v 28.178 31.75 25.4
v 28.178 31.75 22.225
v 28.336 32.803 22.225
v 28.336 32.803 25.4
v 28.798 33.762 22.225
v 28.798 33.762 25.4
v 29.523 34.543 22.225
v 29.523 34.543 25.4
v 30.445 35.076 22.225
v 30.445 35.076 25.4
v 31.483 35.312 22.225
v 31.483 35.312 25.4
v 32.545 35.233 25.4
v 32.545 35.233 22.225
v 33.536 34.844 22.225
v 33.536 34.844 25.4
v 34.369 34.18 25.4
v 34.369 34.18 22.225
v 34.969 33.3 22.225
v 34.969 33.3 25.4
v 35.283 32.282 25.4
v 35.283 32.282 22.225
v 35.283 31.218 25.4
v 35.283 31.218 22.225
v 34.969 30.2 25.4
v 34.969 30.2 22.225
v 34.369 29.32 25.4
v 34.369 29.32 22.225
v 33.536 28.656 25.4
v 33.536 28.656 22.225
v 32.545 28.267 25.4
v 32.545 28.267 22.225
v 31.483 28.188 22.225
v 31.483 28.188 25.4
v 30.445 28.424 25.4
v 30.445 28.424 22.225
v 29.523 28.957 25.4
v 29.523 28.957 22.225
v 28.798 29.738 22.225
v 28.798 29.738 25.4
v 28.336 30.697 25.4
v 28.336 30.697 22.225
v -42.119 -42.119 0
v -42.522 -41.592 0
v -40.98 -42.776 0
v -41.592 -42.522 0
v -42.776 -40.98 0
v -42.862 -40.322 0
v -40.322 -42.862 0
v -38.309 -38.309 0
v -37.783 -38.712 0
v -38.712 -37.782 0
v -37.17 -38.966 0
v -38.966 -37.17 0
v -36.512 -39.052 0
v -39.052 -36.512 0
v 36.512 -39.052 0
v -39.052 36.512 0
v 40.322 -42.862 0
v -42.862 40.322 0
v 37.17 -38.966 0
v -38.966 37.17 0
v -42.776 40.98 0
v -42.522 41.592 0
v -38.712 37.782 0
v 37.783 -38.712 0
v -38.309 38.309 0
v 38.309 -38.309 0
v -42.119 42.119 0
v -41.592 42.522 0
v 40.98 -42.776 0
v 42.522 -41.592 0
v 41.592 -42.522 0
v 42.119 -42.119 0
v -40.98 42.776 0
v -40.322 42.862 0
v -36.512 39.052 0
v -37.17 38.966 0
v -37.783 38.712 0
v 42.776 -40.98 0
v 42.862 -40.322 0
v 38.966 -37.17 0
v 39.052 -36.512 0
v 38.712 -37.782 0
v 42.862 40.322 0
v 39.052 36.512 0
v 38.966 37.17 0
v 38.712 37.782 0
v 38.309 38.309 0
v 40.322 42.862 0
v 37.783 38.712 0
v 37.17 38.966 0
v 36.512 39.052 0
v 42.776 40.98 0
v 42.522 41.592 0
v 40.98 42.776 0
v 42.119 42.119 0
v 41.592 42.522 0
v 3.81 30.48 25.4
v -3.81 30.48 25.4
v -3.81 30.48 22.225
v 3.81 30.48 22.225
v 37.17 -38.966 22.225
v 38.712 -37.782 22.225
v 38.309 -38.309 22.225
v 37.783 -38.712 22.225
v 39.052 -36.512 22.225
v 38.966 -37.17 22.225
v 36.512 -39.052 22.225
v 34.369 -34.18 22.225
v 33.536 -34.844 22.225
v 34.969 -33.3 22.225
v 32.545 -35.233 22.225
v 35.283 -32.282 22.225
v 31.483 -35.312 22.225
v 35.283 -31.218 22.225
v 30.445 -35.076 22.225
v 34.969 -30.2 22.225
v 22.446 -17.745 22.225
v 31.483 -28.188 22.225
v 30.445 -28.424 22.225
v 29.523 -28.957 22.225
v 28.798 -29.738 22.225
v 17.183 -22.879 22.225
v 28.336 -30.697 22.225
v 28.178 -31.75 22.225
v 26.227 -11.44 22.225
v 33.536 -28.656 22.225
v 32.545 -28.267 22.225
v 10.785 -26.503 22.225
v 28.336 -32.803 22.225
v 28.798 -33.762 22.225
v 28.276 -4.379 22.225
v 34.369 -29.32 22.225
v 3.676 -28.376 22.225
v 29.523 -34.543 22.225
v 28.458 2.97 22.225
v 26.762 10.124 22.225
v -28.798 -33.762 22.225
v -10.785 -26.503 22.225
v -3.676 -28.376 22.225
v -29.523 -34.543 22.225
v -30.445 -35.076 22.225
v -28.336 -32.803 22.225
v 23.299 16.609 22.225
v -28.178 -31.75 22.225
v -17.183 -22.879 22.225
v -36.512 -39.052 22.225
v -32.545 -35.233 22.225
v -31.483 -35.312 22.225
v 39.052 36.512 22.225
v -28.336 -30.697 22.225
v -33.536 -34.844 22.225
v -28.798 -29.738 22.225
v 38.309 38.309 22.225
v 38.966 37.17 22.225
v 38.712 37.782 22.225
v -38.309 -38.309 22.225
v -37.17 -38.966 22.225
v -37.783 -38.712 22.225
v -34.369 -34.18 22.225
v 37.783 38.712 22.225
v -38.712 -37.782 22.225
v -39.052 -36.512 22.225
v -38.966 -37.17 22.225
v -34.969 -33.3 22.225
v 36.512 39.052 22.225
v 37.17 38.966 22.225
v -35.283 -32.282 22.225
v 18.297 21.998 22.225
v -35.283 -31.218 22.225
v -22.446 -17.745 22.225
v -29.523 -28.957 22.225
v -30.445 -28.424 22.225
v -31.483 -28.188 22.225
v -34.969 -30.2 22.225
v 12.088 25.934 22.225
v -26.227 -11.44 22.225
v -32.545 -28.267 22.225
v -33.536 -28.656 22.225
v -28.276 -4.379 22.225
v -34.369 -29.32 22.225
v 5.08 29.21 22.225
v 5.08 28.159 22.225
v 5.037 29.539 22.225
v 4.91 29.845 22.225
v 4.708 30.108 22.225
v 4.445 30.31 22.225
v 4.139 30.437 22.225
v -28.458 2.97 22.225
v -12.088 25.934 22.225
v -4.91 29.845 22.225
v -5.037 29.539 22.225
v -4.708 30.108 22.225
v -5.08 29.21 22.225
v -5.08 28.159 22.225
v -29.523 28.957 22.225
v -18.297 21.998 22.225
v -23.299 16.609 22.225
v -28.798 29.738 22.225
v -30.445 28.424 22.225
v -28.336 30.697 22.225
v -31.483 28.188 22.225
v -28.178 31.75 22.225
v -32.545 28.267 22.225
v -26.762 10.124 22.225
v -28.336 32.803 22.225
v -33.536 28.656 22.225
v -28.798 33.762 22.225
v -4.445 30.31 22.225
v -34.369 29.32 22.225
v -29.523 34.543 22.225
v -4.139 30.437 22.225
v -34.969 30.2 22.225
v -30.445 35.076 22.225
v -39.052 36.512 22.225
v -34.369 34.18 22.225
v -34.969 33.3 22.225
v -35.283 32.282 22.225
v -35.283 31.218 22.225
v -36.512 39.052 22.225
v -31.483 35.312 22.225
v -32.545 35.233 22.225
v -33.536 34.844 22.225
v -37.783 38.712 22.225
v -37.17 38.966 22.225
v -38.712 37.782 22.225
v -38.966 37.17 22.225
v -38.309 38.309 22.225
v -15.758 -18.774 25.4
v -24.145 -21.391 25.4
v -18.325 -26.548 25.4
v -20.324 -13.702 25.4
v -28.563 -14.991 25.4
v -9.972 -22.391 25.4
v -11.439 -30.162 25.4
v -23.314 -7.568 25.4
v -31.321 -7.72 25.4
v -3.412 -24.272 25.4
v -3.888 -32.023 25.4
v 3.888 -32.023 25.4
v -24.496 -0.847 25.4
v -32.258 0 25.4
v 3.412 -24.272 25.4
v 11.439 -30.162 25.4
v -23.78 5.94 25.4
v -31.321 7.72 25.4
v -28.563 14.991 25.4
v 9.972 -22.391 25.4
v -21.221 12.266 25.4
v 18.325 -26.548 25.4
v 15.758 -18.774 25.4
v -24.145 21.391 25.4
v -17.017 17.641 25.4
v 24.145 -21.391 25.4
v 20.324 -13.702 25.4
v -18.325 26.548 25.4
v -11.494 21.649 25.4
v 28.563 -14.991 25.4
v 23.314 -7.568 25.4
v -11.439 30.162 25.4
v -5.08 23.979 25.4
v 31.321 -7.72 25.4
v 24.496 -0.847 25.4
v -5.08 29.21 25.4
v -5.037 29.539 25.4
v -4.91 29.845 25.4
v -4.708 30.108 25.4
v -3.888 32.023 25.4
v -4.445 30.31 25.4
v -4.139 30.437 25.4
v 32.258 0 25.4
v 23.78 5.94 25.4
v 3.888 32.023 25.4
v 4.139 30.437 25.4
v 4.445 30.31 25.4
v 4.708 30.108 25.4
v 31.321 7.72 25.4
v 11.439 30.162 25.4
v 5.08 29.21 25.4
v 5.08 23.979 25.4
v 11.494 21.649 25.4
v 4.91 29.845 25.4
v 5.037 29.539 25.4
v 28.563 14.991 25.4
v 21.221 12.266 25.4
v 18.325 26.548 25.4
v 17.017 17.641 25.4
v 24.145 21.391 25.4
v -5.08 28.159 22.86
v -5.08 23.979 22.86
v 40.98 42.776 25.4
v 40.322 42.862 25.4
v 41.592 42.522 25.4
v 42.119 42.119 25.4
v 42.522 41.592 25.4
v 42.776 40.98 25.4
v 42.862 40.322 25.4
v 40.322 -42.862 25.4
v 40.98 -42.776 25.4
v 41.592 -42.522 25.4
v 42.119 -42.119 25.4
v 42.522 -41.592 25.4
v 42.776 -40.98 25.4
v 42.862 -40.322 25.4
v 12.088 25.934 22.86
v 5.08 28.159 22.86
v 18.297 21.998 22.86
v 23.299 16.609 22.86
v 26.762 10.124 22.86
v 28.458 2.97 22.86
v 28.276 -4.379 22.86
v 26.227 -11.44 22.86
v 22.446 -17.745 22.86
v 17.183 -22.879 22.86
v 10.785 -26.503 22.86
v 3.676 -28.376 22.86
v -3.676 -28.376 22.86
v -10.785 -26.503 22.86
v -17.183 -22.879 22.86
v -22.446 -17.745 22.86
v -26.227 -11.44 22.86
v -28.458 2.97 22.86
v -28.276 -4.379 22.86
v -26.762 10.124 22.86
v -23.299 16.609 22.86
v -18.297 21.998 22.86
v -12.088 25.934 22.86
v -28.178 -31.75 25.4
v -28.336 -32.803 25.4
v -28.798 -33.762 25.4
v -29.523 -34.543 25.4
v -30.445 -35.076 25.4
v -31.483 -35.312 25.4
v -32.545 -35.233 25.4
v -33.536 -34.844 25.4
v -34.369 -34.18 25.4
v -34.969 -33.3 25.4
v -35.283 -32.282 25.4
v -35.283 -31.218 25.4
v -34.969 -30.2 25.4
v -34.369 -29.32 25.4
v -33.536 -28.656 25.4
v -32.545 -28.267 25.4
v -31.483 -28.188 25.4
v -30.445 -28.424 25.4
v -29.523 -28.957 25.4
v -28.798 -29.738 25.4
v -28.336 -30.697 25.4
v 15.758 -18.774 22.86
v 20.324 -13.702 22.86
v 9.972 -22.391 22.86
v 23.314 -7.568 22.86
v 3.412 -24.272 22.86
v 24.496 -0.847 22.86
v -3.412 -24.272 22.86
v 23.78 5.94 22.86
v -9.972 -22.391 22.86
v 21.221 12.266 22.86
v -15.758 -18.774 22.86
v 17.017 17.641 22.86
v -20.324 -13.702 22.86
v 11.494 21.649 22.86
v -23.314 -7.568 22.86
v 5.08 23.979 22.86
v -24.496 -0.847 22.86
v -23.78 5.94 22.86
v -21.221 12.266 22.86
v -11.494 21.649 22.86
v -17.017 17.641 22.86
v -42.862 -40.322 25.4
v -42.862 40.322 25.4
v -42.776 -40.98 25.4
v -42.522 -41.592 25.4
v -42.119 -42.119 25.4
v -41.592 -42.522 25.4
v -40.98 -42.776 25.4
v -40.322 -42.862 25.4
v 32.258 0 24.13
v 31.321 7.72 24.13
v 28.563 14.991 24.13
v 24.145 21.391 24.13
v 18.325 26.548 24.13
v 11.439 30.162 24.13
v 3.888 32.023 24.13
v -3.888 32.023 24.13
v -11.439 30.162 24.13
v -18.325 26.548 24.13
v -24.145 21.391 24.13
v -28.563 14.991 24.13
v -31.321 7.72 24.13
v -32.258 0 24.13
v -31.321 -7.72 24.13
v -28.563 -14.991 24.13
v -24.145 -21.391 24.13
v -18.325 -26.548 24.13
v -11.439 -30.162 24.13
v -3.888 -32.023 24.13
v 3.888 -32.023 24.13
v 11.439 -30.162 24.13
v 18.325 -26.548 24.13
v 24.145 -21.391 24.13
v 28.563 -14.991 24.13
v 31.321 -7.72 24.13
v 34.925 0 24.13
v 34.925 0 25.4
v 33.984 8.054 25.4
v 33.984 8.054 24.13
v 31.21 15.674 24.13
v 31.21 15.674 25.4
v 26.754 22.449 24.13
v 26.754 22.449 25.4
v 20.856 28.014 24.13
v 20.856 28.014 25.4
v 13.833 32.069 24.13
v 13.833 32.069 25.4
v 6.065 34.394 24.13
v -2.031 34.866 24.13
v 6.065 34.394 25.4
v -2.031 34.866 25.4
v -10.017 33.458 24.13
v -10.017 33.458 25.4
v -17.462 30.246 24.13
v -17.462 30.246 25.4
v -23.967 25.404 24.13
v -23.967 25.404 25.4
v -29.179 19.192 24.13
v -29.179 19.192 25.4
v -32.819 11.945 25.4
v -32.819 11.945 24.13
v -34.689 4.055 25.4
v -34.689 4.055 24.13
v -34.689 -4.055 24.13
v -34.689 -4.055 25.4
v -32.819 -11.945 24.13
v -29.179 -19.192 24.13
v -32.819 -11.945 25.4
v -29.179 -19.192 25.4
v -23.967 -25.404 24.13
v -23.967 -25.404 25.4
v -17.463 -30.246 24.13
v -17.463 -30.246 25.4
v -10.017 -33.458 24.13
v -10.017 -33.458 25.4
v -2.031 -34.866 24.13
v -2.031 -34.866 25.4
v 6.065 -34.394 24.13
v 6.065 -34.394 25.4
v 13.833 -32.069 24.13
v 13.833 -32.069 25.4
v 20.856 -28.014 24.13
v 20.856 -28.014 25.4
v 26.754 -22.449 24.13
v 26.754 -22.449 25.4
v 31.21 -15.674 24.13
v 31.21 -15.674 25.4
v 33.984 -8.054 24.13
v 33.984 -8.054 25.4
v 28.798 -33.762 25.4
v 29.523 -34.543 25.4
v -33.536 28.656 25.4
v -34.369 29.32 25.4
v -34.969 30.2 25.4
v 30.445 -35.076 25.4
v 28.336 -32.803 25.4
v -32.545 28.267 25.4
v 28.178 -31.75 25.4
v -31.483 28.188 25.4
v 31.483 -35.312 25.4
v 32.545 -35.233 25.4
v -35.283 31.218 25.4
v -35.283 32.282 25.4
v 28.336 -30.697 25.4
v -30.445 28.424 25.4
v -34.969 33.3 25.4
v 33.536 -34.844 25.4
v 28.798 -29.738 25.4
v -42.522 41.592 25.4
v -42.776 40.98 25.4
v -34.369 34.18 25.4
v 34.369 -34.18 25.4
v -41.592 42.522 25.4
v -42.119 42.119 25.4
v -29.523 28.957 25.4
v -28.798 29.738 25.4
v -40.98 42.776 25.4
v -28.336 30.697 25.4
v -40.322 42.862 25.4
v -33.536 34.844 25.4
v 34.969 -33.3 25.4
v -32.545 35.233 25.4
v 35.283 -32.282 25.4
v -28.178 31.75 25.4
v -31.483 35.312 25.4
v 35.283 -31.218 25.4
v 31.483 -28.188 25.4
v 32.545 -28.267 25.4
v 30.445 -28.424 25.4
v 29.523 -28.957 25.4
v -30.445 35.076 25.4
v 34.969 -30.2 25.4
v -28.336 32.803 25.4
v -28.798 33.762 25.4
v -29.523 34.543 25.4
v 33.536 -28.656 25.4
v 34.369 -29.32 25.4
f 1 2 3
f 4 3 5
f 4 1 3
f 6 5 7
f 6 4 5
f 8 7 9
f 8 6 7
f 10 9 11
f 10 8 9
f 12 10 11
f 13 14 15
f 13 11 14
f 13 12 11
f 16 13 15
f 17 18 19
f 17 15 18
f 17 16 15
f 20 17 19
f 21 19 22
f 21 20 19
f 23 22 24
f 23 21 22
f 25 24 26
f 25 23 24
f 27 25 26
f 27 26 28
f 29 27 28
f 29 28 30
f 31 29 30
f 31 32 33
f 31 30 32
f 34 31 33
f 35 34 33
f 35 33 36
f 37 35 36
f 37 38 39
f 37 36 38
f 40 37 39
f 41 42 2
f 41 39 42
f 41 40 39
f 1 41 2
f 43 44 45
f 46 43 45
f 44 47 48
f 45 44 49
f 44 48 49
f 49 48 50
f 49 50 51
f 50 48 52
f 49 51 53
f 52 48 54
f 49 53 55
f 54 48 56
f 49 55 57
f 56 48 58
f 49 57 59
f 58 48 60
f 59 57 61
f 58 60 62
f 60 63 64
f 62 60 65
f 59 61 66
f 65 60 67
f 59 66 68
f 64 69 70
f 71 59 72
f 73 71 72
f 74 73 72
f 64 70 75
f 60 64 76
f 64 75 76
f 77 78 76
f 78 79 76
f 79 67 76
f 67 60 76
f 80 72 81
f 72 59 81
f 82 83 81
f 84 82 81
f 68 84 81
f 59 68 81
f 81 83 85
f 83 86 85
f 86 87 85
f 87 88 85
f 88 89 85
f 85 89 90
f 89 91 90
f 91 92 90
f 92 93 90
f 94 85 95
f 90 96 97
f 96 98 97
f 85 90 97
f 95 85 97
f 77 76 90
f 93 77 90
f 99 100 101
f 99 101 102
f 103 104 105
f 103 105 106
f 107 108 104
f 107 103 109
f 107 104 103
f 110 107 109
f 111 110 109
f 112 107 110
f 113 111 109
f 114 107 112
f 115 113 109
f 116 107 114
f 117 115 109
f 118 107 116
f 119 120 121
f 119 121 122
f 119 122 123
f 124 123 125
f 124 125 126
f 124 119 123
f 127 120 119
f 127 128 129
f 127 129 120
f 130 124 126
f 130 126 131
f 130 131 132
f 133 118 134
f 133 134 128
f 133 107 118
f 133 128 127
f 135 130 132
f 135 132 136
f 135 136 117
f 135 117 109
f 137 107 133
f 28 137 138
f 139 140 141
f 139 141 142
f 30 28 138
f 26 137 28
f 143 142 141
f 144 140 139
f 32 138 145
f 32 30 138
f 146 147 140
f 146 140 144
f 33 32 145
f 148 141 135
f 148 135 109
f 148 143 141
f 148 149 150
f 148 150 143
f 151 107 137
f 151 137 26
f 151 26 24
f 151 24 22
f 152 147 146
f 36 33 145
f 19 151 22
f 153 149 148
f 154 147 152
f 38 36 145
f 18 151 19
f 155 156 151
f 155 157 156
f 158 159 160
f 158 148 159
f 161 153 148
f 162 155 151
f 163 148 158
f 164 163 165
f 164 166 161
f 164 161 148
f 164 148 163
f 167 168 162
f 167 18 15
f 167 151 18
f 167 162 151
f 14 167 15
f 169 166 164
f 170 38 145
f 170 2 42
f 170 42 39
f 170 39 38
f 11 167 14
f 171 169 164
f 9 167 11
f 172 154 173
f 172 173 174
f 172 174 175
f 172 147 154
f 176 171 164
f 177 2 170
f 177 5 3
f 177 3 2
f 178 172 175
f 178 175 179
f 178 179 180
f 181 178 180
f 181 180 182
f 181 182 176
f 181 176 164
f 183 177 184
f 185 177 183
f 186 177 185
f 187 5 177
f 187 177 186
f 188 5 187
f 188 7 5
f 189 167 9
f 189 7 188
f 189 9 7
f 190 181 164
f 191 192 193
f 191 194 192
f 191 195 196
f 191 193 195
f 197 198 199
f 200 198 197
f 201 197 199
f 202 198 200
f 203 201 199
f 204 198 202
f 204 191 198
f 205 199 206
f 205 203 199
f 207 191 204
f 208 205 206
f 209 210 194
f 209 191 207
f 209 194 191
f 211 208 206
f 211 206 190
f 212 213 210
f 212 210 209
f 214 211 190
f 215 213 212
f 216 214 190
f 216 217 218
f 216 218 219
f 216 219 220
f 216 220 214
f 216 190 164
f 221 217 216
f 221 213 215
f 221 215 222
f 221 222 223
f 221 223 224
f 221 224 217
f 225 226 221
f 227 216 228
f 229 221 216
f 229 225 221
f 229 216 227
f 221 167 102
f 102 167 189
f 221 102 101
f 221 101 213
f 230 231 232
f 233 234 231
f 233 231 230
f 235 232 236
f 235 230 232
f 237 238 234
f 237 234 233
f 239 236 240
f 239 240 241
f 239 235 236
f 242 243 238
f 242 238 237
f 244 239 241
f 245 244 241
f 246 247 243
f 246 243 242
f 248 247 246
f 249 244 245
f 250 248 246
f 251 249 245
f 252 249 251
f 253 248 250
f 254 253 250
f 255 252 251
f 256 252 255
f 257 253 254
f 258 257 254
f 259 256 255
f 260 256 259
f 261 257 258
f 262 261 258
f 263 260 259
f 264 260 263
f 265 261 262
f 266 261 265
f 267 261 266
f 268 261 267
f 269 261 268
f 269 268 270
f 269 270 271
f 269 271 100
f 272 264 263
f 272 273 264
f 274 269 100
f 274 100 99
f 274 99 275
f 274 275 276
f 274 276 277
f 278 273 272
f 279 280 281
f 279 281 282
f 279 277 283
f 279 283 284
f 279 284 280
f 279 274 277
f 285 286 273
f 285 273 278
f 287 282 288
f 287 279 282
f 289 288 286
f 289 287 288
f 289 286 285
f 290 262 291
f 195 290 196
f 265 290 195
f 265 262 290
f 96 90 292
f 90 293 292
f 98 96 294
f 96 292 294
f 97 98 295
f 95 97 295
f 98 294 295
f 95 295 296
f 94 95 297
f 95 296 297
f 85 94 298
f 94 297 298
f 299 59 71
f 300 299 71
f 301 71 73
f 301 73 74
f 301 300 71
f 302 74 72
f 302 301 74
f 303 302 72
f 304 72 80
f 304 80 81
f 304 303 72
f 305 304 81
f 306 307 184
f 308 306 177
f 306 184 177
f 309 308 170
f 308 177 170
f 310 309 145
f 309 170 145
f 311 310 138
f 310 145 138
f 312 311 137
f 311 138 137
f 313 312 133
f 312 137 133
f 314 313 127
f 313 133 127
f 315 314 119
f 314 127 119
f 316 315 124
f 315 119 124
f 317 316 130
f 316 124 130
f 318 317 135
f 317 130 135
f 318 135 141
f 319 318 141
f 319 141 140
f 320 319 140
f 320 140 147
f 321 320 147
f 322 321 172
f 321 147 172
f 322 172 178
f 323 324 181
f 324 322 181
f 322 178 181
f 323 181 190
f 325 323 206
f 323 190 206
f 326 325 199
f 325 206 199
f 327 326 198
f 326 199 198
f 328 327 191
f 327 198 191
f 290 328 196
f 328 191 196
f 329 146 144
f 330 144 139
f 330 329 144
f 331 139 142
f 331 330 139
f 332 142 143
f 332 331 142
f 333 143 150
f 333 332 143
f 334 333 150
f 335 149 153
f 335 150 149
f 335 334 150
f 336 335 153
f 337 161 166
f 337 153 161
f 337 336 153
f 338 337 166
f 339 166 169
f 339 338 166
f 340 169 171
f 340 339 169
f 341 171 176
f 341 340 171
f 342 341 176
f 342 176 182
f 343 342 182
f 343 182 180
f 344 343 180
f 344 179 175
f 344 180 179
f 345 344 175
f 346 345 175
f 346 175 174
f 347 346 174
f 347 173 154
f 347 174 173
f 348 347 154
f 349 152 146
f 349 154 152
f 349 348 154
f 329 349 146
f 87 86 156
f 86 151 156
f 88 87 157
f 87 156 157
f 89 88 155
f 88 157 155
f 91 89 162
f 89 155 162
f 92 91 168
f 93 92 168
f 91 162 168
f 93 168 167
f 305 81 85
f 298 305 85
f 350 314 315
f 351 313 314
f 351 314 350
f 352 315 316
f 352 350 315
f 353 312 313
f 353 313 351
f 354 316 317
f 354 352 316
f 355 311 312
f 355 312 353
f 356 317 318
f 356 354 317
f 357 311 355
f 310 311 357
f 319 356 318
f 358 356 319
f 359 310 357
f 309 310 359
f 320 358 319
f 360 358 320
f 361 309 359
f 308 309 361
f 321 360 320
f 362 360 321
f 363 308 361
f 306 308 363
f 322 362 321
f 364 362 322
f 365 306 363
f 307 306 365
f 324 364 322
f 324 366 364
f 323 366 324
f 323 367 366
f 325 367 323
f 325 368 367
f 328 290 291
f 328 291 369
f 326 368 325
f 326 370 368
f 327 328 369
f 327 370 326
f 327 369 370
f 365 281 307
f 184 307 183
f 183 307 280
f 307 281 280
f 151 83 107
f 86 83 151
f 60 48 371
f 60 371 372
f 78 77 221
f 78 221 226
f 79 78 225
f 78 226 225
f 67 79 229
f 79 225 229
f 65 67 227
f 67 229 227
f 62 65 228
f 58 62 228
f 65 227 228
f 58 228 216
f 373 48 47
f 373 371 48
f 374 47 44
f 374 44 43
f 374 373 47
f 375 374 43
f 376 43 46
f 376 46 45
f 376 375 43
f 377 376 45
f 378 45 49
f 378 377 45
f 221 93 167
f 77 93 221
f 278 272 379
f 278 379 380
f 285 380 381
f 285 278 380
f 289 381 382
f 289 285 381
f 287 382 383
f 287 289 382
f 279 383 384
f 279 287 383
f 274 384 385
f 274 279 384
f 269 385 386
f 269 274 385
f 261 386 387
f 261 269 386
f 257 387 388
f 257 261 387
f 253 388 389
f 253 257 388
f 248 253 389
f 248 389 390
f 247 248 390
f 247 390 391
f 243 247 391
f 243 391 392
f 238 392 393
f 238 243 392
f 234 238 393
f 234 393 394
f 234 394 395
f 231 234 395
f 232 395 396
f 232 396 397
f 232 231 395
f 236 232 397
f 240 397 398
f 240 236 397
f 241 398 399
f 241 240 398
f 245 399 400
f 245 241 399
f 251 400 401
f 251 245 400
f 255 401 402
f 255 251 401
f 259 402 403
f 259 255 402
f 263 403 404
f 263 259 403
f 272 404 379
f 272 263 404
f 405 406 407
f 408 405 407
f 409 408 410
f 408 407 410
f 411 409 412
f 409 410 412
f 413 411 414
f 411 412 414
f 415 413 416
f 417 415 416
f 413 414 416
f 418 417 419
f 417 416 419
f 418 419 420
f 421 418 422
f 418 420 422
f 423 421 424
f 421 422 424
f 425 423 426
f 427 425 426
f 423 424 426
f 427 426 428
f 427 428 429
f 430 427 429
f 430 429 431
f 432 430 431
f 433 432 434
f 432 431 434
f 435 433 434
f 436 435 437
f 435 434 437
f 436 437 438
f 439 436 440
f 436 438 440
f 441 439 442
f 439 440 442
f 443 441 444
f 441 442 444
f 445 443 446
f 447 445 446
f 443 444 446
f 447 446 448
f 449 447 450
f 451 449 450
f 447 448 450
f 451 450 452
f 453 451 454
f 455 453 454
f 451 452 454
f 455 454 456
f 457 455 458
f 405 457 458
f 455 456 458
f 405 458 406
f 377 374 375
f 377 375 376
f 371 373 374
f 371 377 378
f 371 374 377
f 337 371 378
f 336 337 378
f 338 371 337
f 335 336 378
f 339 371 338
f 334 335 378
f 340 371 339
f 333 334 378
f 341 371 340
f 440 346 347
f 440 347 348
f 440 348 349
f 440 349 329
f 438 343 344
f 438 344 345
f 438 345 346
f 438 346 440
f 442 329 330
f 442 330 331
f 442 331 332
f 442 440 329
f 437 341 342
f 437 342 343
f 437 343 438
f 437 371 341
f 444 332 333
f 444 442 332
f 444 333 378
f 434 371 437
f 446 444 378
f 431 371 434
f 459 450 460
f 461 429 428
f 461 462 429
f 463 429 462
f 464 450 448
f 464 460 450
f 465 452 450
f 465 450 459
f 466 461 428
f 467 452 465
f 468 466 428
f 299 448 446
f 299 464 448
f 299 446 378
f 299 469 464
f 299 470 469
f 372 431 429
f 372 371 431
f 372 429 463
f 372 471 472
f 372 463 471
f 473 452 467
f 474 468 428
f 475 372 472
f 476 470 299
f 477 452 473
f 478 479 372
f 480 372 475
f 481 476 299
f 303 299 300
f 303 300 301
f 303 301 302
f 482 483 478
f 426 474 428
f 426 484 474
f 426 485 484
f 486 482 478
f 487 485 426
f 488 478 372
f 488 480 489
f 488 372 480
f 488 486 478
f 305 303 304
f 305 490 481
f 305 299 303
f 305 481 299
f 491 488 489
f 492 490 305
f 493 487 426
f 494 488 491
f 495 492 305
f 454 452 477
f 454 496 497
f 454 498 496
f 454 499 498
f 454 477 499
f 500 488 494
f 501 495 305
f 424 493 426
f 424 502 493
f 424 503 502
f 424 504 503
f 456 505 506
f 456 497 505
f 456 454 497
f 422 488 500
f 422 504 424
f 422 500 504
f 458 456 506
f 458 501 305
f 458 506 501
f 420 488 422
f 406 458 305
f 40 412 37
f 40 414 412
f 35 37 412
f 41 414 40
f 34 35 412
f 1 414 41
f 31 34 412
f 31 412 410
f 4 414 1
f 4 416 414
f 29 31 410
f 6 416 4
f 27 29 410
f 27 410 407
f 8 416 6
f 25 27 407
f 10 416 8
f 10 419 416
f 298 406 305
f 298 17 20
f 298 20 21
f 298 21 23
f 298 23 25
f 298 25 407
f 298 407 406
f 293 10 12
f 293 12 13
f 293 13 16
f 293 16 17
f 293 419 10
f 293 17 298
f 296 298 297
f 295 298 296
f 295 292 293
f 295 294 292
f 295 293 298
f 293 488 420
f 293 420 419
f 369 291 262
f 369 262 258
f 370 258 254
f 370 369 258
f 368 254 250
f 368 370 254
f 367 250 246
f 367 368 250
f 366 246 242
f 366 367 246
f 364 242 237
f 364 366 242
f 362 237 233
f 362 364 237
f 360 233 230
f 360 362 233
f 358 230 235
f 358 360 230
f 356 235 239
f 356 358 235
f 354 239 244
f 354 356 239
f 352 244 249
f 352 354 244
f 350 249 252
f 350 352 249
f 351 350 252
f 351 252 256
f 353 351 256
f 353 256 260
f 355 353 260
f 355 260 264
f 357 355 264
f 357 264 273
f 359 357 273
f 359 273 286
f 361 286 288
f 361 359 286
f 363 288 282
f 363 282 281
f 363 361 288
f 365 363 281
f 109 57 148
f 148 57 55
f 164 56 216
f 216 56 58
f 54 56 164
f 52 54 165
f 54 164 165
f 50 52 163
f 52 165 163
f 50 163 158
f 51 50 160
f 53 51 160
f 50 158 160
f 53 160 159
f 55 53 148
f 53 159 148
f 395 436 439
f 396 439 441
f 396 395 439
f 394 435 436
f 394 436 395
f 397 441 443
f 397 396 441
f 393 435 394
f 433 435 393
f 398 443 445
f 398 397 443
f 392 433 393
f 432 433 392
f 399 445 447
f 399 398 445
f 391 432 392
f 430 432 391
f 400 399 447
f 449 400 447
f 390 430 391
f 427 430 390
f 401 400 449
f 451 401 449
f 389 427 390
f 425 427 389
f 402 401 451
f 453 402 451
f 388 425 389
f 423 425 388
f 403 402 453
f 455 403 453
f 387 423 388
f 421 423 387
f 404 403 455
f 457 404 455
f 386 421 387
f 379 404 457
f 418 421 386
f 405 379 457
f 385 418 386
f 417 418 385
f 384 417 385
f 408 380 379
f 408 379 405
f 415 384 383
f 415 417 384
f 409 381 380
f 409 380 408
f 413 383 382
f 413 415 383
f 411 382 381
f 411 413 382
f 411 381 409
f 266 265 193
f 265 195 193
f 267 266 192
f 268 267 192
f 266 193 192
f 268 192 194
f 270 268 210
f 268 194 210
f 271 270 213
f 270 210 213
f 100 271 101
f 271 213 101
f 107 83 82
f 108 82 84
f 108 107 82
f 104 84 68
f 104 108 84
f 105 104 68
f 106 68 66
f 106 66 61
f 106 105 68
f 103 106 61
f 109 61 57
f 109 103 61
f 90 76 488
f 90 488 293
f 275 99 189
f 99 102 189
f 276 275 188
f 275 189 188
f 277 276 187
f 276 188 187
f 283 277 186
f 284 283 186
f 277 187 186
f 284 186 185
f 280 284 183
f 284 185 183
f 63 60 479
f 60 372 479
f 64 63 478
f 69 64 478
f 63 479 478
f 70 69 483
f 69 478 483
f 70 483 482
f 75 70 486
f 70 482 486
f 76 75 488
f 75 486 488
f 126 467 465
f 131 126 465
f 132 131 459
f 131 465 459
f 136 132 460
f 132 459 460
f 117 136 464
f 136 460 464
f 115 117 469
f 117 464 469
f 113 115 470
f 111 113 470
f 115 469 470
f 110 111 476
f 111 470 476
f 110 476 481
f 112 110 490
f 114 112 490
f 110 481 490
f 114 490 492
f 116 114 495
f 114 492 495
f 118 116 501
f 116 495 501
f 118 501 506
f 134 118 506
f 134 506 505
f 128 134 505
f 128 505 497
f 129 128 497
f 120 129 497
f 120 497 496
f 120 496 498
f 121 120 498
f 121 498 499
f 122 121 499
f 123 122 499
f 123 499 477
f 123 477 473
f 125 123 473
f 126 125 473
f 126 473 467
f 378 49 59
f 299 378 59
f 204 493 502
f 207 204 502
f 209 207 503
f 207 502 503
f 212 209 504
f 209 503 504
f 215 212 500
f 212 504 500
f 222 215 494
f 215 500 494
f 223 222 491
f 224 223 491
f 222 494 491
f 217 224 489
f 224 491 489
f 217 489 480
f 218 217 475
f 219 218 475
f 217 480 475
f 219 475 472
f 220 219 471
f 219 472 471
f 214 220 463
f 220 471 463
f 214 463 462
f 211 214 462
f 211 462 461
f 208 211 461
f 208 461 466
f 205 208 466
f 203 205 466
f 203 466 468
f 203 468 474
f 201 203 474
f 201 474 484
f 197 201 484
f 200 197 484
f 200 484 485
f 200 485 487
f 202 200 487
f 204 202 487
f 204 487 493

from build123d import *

# Parameters (mm, degrees)
SKETCH1_W               = 85.725
SKETCH1_H               = 85.725
SKETCH1_R               = 24.511
BOSS_EXTRUDE1_DEPTH     = 25.4
SKETCH2_R               = 3.572453457
CUT_EXTRUDE1_DEPTH      = 26.4
MIRROR2_COPY_1_SKETCH_R = 3.572453457
MIRROR2_COPY_1_DEPTH    = 26.4
SKETCH3_W               = 78.105
SKETCH3_H               = 78.105
CUT_EXTRUDE2_DEPTH      = 22.225
FILLET1_R               = 2.54
SKETCH5_R               = 34.925
SKETCH5_R_2             = 32.258
CUT_EXTRUDE4_DEPTH      = 1.27
SKETCH6_W               = 10.16
SKETCH6_H               = 11.43
CUT_EXTRUDE5_DEPTH      = 26.4
FILLET2_R               = 1.27
SKETCH7_R               = 28.6131
CUT_EXTRUDE6_DEPTH      = 0.635


with BuildPart() as part:
    # Sketch1 → Boss-Extrude1 (new body)
    with BuildSketch(Plane.XY):
        Rectangle(SKETCH1_W, SKETCH1_H)
        Circle(SKETCH1_R, mode=Mode.SUBTRACT)
    extrude(amount=BOSS_EXTRUDE1_DEPTH)

    # Sketch2 → Cut-Extrude1 (cut, through all)
    with BuildSketch(Plane.XY.offset(25.4)):
        with Locations((-31.75, 31.75)):
            Circle(SKETCH2_R)
    cut_extrude1 = extrude(amount=-CUT_EXTRUDE1_DEPTH, mode=Mode.SUBTRACT)

    # Mirror1: Cut-Extrude1 across plane
    add(cut_extrude1.mirror(Plane(origin=(0, 0, 0), x_dir=(0, 0, 1), z_dir=(1, 0, 0))), mode=Mode.SUBTRACT)

    # Mirror2: Cut-Extrude1 across plane
    add(cut_extrude1.mirror(Plane.ZX), mode=Mode.SUBTRACT)

    # Mirror2 copy 1 sketch → Mirror2 copy 1 (cut, through all)
    with BuildSketch(Plane(origin=(0, 0, 25.4), x_dir=(-1, 0, 0), z_dir=(0, 0, 1))):
        with Locations((-31.75, 31.75)):
            Circle(MIRROR2_COPY_1_SKETCH_R)
    extrude(amount=-MIRROR2_COPY_1_DEPTH, mode=Mode.SUBTRACT)

    # Sketch3 → Cut-Extrude2 (cut)
    with BuildSketch(Plane(origin=(0, 0, 0), x_dir=(-1, 0, 0), z_dir=(0, 0, -1))):
        Rectangle(SKETCH3_W, SKETCH3_H)
    extrude(amount=-CUT_EXTRUDE2_DEPTH, mode=Mode.SUBTRACT)

    # Fillet1
    fillet1_edges = [part.edges().sort_by_distance(p)[0] for p in [
        (-39.0525, -39.0525, 11.1125),
        (-39.0525, 39.0525, 11.1125),
        (39.0525, 39.0525, 11.1125),
        (39.0525, -39.0525, 11.1125),
        (-42.8625, 42.8625, 12.7),
        (42.8625, 42.8625, 12.7),
        (42.8625, -42.8625, 12.7),
        (-42.8625, -42.8625, 12.7),
    ]]
    fillet(fillet1_edges, radius=FILLET1_R)

    # Sketch5 → Cut-Extrude4 (cut)
    with BuildSketch(Plane.XY.offset(25.4)):
        Circle(SKETCH5_R)
        Circle(SKETCH5_R_2, mode=Mode.SUBTRACT)
    extrude(amount=-CUT_EXTRUDE4_DEPTH, mode=Mode.SUBTRACT)

    # Sketch6 → Cut-Extrude5 (cut, through all)
    with BuildSketch(Plane.XY.offset(25.4)):
        with Locations((0, 24.765)):
            Rectangle(SKETCH6_W, SKETCH6_H)
    extrude(amount=-CUT_EXTRUDE5_DEPTH, mode=Mode.SUBTRACT)

    # Fillet2
    fillet2_edges = [part.edges().sort_by_distance(p)[0] for p in [
        (-5.08, 30.48, 23.8125),
        (5.08, 30.48, 23.8125),
    ]]
    fillet(fillet2_edges, radius=FILLET2_R)

    # Sketch7 → Cut-Extrude6 (cut)
    with BuildSketch(Plane(origin=(0, 0, 22.225), x_dir=(-1, 0, 0), z_dir=(0, 0, -1))):
        Circle(SKETCH7_R)
    extrude(amount=-CUT_EXTRUDE6_DEPTH, mode=Mode.SUBTRACT)


solid = part.part
